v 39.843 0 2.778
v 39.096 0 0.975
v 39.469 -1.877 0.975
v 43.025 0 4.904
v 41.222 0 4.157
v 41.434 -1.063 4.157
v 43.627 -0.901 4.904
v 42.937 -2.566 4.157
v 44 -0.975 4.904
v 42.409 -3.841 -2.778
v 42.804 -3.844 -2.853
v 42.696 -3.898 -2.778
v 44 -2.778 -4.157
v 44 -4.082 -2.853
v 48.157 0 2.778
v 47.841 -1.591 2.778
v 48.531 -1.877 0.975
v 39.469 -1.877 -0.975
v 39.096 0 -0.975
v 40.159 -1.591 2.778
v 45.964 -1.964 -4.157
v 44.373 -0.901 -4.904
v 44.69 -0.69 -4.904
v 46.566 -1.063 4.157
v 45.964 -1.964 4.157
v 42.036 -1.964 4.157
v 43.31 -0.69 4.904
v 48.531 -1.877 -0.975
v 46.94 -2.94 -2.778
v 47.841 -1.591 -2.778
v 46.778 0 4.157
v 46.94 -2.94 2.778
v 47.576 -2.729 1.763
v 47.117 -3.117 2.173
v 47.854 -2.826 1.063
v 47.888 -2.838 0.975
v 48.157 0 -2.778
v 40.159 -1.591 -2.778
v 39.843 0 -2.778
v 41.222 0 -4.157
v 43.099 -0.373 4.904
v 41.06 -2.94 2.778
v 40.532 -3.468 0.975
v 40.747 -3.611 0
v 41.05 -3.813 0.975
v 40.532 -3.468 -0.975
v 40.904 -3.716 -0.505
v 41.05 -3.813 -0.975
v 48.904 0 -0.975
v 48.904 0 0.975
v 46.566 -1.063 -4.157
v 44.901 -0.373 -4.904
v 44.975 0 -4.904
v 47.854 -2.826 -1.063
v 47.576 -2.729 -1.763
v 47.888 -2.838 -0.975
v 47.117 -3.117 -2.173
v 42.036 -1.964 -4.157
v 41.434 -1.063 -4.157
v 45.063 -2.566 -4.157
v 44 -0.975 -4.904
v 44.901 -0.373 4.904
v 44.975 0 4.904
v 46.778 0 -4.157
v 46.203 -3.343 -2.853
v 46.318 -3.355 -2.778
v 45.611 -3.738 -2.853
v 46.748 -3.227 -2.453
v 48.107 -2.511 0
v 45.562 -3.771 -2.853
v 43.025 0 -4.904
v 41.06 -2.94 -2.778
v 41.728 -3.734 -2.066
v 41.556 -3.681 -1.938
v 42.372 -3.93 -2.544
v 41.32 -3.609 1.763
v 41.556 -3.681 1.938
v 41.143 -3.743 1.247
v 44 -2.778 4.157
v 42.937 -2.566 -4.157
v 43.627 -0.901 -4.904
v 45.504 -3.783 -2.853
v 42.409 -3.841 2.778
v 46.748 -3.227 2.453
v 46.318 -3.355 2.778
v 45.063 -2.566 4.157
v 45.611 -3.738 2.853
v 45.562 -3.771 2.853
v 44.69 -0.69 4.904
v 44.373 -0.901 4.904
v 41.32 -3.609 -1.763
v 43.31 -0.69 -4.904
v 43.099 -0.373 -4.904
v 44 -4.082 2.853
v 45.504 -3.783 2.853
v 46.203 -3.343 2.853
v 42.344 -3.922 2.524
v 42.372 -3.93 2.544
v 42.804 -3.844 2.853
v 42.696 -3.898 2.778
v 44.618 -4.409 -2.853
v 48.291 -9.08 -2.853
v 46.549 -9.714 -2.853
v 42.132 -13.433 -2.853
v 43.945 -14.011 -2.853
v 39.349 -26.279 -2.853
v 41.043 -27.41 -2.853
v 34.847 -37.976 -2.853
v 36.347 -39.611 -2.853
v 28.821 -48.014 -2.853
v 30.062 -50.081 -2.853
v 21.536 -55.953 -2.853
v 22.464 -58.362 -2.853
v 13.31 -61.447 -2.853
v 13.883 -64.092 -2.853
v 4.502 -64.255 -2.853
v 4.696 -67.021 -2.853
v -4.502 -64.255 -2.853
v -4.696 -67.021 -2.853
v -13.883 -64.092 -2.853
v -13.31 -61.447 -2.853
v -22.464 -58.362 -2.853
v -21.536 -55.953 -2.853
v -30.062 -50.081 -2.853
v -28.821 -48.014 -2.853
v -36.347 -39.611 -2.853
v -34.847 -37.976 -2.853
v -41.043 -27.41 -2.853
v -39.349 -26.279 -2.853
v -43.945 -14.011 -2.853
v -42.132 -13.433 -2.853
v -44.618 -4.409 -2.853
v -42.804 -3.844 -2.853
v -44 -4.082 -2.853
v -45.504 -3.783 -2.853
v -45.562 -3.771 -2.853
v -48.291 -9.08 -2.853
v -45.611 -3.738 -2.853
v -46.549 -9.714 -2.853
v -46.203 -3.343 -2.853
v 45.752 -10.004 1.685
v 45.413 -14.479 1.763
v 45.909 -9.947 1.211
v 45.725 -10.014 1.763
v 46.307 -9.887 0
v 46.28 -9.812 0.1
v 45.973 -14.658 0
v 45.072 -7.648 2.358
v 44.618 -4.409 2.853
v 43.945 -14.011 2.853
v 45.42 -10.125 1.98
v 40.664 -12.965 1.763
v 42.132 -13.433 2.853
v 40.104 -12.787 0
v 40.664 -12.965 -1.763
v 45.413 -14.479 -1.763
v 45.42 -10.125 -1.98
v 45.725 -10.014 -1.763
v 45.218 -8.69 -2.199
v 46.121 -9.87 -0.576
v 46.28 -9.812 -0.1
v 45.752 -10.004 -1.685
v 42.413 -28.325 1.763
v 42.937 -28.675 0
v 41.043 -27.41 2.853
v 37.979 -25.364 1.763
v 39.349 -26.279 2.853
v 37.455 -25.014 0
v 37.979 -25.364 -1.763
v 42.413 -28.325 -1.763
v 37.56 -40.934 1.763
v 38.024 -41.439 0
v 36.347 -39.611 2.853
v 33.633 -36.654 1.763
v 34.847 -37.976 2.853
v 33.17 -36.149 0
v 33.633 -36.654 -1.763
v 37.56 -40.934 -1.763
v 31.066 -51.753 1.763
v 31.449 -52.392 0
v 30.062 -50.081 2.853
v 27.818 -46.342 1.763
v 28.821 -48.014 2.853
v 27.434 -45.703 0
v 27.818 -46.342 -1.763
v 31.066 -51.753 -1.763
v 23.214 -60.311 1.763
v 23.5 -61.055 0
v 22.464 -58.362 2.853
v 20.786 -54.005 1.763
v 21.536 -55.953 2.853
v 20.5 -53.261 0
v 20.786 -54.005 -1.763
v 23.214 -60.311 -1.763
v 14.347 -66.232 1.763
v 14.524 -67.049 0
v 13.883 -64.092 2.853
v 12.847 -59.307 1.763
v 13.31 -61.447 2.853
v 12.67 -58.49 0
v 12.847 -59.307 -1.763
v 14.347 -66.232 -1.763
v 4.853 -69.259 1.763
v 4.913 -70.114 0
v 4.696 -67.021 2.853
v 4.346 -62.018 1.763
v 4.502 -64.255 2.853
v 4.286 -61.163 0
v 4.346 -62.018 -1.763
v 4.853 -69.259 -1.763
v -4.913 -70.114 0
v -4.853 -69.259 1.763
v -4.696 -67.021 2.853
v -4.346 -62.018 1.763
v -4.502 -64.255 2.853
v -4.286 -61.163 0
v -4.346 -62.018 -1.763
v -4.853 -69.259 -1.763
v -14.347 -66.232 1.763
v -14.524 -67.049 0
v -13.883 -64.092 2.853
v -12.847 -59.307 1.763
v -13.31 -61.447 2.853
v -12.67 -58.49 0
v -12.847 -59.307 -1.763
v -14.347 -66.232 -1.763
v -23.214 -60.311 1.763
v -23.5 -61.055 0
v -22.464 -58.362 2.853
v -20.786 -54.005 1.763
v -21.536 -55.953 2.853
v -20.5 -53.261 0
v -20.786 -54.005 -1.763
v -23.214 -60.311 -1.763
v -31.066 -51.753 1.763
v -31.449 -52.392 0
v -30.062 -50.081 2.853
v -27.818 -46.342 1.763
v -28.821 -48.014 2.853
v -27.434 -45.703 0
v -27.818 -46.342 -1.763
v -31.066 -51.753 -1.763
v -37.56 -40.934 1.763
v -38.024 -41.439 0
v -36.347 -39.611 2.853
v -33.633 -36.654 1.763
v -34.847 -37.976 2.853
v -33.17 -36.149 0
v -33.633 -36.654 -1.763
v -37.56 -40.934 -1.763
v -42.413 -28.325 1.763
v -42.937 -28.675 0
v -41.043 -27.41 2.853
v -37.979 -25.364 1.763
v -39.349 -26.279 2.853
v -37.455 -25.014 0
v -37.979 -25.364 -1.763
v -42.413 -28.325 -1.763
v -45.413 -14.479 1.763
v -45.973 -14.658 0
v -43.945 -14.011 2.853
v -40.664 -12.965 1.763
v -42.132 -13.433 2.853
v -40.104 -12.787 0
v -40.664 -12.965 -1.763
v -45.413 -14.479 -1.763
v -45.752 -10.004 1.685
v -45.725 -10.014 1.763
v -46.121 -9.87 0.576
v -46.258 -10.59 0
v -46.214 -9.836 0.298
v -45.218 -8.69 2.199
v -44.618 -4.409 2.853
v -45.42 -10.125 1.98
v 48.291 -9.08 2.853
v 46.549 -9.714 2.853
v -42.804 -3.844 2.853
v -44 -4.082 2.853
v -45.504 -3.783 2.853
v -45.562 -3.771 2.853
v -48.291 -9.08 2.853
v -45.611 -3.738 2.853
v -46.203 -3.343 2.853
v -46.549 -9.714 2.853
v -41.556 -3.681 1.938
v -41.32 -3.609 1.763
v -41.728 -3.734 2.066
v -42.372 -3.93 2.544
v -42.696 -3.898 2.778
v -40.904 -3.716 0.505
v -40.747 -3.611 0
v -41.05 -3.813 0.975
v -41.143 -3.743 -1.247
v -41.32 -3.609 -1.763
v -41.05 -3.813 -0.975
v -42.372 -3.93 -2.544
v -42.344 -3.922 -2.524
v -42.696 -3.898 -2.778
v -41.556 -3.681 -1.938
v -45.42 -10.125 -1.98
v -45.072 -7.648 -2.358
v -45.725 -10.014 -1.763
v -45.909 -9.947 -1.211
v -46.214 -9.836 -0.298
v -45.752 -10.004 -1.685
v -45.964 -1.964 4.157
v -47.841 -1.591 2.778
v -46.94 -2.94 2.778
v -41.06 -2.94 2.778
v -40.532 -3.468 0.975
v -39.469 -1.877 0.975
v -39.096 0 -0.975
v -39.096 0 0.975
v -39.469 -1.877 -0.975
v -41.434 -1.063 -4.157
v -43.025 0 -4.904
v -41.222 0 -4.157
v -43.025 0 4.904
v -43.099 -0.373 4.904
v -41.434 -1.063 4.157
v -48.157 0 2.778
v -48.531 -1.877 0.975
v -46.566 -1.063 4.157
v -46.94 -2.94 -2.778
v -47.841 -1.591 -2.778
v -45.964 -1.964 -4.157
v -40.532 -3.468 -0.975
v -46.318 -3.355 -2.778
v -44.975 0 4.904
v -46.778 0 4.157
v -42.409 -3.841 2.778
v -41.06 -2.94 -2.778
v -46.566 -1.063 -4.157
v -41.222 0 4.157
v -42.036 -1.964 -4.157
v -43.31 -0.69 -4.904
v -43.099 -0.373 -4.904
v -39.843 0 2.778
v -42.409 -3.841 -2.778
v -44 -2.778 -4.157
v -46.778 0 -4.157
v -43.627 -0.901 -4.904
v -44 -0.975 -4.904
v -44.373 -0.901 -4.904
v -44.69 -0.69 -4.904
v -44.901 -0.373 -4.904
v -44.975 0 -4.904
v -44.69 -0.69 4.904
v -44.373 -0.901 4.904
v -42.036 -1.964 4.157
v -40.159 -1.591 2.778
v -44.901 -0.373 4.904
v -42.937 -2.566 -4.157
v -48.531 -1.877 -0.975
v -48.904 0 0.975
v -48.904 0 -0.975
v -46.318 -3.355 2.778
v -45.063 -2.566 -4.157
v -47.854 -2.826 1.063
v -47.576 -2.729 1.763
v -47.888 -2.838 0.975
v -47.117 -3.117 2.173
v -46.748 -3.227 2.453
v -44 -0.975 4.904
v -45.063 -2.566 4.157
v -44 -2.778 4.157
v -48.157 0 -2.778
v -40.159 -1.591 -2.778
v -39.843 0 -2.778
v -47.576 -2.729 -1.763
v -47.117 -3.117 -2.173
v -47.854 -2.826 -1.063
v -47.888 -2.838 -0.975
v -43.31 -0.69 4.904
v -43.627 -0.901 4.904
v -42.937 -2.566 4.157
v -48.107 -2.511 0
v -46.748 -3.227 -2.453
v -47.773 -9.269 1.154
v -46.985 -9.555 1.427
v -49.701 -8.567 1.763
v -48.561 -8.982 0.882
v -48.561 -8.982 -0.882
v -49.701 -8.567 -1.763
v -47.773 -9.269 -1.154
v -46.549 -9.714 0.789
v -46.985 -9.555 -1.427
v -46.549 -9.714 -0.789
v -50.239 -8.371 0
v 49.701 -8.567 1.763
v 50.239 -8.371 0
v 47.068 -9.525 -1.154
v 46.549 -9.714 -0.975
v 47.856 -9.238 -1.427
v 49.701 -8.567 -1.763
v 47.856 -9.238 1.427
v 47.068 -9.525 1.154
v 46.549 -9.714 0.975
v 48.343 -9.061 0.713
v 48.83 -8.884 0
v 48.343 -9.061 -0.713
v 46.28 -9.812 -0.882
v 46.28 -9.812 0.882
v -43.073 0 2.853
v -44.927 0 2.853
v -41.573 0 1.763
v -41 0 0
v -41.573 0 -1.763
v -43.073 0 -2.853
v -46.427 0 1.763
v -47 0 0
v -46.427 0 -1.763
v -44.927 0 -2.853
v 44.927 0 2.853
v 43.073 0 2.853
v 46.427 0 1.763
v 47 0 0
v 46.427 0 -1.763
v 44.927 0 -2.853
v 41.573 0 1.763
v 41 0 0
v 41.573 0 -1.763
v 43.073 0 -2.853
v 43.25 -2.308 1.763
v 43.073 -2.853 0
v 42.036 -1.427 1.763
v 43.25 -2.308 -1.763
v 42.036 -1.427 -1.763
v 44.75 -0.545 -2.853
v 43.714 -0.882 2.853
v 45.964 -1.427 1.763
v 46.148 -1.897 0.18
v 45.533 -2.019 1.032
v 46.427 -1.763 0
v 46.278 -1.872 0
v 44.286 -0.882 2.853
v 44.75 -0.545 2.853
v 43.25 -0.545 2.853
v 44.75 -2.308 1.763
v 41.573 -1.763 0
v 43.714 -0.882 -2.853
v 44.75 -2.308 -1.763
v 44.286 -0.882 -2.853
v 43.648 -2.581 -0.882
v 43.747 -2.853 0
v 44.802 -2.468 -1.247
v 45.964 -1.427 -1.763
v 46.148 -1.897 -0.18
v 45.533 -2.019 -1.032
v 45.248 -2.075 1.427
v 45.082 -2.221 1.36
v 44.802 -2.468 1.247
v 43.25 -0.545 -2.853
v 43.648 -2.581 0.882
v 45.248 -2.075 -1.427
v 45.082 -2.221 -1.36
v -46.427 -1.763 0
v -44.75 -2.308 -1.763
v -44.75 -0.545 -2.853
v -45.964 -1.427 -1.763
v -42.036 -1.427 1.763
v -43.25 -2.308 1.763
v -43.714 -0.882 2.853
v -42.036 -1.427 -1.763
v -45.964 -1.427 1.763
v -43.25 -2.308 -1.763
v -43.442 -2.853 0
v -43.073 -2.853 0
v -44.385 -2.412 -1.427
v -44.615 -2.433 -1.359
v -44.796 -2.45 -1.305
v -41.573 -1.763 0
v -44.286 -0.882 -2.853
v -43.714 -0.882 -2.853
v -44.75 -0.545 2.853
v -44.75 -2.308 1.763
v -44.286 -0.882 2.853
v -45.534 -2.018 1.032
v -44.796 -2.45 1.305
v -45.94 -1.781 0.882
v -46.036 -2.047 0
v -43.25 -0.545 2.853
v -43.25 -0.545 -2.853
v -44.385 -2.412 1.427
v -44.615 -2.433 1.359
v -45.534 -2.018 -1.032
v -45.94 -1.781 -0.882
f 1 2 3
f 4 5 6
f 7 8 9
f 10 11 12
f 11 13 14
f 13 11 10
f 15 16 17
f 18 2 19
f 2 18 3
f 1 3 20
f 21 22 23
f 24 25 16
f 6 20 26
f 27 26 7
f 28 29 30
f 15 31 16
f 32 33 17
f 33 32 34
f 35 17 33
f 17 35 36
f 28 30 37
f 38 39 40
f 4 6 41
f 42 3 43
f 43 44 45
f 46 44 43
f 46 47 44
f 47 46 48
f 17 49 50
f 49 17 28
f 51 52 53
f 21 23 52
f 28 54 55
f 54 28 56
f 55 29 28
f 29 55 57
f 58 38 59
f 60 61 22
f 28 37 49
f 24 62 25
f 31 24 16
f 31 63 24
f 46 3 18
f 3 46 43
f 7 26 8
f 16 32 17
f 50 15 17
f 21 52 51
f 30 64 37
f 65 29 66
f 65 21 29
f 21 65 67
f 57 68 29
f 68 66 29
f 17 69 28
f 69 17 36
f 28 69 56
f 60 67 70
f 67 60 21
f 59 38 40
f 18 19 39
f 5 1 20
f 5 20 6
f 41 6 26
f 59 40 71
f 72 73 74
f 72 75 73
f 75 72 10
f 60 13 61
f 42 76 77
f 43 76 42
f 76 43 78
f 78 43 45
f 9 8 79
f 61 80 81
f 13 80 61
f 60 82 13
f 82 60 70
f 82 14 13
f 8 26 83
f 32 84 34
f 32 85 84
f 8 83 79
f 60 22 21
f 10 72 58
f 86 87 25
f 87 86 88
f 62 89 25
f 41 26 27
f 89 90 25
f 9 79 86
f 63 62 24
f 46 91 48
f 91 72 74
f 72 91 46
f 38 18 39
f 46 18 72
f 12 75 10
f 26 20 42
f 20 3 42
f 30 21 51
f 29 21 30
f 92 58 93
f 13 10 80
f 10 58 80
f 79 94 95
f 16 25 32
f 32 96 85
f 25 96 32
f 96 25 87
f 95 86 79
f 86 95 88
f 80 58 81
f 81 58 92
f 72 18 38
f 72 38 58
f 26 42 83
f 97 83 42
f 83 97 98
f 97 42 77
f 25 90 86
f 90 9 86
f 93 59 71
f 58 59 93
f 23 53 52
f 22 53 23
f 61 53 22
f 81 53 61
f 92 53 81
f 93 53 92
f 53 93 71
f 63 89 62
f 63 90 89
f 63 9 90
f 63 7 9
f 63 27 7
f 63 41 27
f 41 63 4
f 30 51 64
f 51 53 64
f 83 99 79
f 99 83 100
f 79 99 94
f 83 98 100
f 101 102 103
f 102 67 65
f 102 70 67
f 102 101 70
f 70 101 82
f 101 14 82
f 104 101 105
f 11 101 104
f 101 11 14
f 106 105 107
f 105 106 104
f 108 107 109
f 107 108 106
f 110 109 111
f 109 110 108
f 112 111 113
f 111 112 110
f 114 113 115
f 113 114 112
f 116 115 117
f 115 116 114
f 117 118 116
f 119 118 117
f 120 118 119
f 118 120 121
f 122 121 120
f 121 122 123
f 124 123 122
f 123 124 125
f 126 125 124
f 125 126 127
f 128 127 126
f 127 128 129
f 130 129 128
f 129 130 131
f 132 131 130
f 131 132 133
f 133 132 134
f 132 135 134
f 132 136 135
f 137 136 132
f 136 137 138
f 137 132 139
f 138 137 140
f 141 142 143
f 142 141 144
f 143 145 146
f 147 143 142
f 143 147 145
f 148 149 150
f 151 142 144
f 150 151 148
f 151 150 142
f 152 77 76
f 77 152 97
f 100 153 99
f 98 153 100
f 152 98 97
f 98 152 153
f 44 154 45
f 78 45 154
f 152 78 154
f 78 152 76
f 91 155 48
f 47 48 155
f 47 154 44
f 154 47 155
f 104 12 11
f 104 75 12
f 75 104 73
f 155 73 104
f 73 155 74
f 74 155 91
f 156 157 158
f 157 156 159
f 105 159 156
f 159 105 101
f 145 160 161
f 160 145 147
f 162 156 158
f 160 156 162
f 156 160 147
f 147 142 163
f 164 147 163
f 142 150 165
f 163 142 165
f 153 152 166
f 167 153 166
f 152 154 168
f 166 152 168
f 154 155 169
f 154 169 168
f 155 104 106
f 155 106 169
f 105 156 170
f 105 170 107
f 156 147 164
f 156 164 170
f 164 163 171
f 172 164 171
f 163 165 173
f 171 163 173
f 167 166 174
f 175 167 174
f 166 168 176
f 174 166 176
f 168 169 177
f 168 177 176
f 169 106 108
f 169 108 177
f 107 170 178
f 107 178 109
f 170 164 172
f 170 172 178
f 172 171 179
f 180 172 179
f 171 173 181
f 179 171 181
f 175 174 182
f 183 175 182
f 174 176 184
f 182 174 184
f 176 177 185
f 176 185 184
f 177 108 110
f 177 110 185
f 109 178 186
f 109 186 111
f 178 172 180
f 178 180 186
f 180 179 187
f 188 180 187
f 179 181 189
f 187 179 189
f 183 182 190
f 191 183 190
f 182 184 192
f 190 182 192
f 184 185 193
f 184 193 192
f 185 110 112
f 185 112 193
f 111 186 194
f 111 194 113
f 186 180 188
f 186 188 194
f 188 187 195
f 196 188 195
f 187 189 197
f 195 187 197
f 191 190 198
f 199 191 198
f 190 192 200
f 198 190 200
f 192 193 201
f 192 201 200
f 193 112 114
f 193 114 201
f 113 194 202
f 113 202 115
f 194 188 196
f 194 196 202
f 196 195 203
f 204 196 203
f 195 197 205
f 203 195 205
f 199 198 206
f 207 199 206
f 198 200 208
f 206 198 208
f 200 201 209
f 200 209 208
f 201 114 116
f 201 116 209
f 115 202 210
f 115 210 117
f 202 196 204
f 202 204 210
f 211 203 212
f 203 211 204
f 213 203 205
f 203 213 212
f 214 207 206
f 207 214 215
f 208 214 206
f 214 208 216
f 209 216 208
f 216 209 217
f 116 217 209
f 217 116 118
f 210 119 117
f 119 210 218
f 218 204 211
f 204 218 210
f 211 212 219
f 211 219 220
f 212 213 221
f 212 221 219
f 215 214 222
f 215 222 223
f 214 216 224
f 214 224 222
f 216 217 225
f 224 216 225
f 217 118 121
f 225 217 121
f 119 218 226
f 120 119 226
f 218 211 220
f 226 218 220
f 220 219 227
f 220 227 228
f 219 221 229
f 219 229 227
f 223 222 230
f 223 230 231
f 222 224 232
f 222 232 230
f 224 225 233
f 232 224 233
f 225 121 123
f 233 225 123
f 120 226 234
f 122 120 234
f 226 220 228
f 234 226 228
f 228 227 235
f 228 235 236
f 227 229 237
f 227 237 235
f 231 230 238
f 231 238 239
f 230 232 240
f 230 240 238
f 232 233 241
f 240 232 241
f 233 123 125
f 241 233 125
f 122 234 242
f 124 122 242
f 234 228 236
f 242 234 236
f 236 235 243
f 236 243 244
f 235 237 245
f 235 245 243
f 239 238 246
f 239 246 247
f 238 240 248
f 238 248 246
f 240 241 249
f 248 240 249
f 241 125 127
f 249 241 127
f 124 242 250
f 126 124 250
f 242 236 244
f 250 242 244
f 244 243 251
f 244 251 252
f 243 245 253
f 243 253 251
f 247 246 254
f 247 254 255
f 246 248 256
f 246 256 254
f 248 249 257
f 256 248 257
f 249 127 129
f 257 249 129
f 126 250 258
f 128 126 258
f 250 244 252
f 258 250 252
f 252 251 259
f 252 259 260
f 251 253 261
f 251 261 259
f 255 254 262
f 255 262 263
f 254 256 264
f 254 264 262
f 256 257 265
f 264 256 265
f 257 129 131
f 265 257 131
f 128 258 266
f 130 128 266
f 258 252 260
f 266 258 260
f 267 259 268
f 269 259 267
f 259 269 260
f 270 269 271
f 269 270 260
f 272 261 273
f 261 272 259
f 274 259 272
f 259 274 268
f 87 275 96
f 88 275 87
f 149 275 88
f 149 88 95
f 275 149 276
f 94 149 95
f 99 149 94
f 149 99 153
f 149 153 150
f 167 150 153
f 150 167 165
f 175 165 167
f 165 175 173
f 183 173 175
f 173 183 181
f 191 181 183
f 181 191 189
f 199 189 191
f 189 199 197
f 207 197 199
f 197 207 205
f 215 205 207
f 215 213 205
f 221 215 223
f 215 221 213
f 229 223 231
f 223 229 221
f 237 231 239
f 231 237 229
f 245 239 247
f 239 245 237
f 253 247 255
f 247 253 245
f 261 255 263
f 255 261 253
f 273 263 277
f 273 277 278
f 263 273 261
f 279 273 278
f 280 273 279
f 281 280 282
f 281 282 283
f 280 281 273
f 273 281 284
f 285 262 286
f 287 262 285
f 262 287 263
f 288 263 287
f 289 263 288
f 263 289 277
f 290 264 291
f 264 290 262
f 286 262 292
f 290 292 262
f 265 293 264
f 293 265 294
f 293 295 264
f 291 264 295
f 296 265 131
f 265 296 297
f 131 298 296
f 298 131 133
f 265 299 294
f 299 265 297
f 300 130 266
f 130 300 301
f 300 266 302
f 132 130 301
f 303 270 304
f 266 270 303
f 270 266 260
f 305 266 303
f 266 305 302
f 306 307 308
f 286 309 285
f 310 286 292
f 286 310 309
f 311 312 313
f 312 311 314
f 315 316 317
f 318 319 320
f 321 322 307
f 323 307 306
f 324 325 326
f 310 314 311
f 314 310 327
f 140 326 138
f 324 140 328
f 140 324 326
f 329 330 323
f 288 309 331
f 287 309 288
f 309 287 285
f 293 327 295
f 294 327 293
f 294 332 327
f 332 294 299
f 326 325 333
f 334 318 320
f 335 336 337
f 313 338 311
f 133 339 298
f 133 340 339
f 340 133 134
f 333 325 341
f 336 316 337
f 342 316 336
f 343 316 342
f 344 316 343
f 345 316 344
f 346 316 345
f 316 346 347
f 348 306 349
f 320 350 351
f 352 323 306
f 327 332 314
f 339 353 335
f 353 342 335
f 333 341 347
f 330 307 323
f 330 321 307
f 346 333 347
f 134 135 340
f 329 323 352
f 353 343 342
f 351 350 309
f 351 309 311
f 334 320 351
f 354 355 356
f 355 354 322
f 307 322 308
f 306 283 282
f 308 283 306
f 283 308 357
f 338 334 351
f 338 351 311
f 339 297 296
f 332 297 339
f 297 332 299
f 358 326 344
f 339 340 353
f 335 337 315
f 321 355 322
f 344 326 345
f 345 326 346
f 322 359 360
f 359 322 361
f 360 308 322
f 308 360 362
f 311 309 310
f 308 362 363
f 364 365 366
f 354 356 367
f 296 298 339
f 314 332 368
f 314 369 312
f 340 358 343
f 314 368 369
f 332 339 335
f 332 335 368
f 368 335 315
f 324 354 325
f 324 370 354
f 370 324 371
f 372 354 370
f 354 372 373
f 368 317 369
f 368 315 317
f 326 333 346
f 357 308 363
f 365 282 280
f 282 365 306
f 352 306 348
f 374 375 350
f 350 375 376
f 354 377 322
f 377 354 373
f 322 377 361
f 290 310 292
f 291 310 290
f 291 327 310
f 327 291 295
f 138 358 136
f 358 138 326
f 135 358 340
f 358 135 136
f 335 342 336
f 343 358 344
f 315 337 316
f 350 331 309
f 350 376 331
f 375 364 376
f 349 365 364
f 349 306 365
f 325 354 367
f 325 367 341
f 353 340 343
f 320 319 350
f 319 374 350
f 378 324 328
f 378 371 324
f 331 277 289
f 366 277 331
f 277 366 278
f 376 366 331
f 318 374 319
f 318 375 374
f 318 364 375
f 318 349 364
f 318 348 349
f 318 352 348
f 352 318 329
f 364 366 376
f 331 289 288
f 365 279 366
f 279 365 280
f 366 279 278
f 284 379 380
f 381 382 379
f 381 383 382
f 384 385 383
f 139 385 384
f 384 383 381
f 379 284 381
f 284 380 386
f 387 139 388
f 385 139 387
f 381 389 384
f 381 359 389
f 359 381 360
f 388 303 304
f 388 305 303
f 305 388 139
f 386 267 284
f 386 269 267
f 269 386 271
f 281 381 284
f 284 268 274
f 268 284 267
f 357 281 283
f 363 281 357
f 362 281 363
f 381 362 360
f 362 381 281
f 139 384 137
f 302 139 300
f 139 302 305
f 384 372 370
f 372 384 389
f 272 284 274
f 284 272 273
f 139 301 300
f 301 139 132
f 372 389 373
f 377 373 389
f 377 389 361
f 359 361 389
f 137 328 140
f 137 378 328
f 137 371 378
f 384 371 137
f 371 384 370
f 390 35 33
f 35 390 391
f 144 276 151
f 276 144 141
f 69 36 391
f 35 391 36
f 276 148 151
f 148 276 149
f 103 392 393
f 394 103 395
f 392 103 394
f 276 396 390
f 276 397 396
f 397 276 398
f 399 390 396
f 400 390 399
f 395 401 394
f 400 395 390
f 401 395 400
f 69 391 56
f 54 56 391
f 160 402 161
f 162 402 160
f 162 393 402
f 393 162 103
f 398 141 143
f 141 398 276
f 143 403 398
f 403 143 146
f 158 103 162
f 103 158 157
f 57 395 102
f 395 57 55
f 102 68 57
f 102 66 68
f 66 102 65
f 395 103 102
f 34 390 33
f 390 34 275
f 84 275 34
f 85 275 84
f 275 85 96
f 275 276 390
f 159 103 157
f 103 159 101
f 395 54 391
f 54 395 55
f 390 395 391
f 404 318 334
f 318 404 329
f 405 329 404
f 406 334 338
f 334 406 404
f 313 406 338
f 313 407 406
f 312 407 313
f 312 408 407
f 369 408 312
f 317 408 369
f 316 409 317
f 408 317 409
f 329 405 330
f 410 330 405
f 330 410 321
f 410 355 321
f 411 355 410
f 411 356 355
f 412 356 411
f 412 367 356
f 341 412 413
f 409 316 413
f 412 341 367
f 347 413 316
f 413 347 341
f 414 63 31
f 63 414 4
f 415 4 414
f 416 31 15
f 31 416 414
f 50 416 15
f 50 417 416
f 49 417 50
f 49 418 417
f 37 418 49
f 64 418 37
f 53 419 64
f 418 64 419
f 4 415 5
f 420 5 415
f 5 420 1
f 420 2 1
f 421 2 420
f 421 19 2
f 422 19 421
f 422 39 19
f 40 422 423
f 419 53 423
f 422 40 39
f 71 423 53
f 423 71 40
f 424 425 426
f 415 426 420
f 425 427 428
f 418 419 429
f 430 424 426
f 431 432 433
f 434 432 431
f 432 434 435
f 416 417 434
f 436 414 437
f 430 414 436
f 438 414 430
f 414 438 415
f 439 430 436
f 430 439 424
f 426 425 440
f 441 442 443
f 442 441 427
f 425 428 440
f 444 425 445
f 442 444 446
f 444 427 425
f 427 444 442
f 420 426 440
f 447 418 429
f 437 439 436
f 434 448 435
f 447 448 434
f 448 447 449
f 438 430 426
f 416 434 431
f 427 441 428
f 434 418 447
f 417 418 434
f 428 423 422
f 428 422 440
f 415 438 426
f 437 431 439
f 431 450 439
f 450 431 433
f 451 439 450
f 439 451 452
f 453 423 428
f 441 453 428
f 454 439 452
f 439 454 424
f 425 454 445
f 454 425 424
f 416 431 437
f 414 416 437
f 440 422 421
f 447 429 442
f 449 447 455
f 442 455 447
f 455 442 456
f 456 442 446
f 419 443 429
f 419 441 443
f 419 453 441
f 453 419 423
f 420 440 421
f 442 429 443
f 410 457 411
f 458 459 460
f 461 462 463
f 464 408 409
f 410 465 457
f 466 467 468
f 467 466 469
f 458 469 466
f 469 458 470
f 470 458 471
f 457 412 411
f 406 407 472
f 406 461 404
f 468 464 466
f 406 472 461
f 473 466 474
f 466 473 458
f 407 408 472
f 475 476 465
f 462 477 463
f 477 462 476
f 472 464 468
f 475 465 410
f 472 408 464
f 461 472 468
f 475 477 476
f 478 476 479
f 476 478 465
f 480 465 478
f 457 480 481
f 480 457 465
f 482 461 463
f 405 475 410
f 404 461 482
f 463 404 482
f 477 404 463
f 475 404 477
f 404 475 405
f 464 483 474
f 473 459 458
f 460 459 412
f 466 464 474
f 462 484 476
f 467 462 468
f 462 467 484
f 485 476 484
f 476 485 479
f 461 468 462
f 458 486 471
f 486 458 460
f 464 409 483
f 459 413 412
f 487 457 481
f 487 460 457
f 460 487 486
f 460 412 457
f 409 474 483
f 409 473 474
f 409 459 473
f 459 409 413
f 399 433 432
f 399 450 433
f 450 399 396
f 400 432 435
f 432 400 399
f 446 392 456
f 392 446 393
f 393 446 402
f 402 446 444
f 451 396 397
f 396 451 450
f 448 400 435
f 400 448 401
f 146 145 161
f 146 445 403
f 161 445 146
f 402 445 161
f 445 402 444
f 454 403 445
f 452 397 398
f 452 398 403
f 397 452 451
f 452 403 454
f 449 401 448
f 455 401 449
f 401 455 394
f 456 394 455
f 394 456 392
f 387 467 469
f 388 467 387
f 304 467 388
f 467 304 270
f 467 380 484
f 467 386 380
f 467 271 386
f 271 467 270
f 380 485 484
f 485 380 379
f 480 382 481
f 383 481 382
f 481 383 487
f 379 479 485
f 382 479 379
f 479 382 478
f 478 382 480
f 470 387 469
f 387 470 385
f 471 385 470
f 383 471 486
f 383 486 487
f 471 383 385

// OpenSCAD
echo ("Copyright 2018 Nevit Dilmen");
echo ("Creative Commons Attribution Share Alike");
// Ineterpedincular distance
$InterP=44;
// Angle of screw
$Aci=20;
// Hole diameter
$delik=3;
// Body size
$tup=10;

difference (){
difference (){
difference (){
difference (){
difference (){
union(){
union(){
union(){
translate([-$InterP, 0, 0])
sphere(5);

union(){
translate([$InterP, 0, 0])
sphere(5);

scale([1,1.5,1])
rotate_extrude()
translate([$InterP, 0, 0])
circle(r = 3);
}}

translate([-$InterP, 0, 0])
rotate([90,0,-$Aci])
cylinder($tup,d=$delik+3);
}
translate([$InterP, 0, 0])
rotate([90,0,$Aci])
cylinder($tup,d=$delik+3);
}
translate([0, $InterP*1.5, 0])
cube($InterP*3, center=true);
}

translate([$InterP, 0, 0])

sphere(3);
}

translate([-$InterP, 0, 0])

sphere(3);
}

translate([$InterP, 0, 0])
rotate([90,0,$Aci])
cylinder($tup*2,d=$delik);
}

translate([-$InterP, 0, 0])
rotate([90,0,-$Aci])
cylinder($tup*2,d=$delik);
}
